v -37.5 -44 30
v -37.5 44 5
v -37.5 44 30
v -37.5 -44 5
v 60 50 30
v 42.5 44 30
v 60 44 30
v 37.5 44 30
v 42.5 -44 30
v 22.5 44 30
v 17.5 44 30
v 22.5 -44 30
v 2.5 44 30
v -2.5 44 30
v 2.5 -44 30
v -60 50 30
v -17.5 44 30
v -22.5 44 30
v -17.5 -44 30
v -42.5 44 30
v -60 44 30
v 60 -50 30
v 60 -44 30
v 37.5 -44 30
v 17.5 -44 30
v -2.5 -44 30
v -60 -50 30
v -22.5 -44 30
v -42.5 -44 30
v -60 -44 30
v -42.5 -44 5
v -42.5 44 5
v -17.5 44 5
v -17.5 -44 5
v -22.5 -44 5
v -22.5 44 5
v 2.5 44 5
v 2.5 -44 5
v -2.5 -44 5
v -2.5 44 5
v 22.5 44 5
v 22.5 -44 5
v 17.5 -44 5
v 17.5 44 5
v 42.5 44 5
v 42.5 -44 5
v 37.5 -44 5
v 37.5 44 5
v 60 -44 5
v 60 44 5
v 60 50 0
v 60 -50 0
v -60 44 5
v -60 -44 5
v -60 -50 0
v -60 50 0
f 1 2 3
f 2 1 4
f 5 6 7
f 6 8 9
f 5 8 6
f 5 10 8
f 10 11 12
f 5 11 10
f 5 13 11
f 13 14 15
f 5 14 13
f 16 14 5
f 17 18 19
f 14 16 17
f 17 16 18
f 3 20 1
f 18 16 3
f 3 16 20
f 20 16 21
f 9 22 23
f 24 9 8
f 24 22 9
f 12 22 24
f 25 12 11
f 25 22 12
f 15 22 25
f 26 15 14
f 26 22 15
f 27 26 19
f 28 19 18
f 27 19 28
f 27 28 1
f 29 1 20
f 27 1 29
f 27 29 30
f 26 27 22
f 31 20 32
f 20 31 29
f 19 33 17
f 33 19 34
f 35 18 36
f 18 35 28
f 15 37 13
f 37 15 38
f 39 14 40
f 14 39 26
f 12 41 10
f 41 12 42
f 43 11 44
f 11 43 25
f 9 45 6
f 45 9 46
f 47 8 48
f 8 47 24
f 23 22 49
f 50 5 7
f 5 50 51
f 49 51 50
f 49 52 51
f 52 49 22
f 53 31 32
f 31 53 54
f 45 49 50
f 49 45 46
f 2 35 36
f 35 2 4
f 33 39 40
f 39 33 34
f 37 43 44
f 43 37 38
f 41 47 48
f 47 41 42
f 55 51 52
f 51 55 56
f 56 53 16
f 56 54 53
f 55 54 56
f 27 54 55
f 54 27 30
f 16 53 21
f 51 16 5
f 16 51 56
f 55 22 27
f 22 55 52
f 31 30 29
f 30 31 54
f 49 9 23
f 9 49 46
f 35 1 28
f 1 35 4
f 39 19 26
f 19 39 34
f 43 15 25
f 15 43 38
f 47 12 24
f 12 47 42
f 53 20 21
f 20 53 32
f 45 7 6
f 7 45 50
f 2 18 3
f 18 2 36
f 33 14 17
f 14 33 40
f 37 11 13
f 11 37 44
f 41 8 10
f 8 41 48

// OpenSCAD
$fn = 32;

// ----------------------------------------------------------------------
// Rib frame 120 x 100 x 30
// 5 ribs at 20 mm pitch
// ----------------------------------------------------------------------

// --- parameters (mm) ---
frame = [120, 100, 5];  // base plate size (x, y, z)
rail_w = 6;             // side rail width
ribs = 5;               // number of ribs
rib_t = 5;              // rib thickness
rib_h = 25;             // rib height above the base plate
pitch = 20;             // pitch between rib centres

// --- derived feature positions (mm) ---
span = (ribs - 1) * pitch;          // = 80   distance between the outer ribs
origin_x = -span / 2;               // = -40   X of the first rib
rib_len = frame[1] - 2 * rail_w + 2;  // = 90   rib length, 1 mm into each rail
feature_centers = [
  [origin_x + 0 * pitch, 0],
  [origin_x + 1 * pitch, 0],
  [origin_x + 2 * pitch, 0],
  [origin_x + 3 * pitch, 0],
  [origin_x + 4 * pitch, 0]
];   // rib centre line, drives the rib loop

// base plate, two side rails, then the ribs read straight off feature_centers
union() {
  translate([-frame[0] / 2, -frame[1] / 2, 0]) cube(frame);
  translate([-frame[0] / 2, -frame[1] / 2, 0]) cube([frame[0], rail_w, frame[2] + rib_h]);
  translate([-frame[0] / 2, frame[1] / 2 - rail_w, 0]) cube([frame[0], rail_w, frame[2] + rib_h]);
  for (centre = feature_centers)
    translate([centre[0] - rib_t / 2, centre[1] - rib_len / 2, frame[2] - 1])
      cube([rib_t, rib_len, rib_h + 1]);
}
